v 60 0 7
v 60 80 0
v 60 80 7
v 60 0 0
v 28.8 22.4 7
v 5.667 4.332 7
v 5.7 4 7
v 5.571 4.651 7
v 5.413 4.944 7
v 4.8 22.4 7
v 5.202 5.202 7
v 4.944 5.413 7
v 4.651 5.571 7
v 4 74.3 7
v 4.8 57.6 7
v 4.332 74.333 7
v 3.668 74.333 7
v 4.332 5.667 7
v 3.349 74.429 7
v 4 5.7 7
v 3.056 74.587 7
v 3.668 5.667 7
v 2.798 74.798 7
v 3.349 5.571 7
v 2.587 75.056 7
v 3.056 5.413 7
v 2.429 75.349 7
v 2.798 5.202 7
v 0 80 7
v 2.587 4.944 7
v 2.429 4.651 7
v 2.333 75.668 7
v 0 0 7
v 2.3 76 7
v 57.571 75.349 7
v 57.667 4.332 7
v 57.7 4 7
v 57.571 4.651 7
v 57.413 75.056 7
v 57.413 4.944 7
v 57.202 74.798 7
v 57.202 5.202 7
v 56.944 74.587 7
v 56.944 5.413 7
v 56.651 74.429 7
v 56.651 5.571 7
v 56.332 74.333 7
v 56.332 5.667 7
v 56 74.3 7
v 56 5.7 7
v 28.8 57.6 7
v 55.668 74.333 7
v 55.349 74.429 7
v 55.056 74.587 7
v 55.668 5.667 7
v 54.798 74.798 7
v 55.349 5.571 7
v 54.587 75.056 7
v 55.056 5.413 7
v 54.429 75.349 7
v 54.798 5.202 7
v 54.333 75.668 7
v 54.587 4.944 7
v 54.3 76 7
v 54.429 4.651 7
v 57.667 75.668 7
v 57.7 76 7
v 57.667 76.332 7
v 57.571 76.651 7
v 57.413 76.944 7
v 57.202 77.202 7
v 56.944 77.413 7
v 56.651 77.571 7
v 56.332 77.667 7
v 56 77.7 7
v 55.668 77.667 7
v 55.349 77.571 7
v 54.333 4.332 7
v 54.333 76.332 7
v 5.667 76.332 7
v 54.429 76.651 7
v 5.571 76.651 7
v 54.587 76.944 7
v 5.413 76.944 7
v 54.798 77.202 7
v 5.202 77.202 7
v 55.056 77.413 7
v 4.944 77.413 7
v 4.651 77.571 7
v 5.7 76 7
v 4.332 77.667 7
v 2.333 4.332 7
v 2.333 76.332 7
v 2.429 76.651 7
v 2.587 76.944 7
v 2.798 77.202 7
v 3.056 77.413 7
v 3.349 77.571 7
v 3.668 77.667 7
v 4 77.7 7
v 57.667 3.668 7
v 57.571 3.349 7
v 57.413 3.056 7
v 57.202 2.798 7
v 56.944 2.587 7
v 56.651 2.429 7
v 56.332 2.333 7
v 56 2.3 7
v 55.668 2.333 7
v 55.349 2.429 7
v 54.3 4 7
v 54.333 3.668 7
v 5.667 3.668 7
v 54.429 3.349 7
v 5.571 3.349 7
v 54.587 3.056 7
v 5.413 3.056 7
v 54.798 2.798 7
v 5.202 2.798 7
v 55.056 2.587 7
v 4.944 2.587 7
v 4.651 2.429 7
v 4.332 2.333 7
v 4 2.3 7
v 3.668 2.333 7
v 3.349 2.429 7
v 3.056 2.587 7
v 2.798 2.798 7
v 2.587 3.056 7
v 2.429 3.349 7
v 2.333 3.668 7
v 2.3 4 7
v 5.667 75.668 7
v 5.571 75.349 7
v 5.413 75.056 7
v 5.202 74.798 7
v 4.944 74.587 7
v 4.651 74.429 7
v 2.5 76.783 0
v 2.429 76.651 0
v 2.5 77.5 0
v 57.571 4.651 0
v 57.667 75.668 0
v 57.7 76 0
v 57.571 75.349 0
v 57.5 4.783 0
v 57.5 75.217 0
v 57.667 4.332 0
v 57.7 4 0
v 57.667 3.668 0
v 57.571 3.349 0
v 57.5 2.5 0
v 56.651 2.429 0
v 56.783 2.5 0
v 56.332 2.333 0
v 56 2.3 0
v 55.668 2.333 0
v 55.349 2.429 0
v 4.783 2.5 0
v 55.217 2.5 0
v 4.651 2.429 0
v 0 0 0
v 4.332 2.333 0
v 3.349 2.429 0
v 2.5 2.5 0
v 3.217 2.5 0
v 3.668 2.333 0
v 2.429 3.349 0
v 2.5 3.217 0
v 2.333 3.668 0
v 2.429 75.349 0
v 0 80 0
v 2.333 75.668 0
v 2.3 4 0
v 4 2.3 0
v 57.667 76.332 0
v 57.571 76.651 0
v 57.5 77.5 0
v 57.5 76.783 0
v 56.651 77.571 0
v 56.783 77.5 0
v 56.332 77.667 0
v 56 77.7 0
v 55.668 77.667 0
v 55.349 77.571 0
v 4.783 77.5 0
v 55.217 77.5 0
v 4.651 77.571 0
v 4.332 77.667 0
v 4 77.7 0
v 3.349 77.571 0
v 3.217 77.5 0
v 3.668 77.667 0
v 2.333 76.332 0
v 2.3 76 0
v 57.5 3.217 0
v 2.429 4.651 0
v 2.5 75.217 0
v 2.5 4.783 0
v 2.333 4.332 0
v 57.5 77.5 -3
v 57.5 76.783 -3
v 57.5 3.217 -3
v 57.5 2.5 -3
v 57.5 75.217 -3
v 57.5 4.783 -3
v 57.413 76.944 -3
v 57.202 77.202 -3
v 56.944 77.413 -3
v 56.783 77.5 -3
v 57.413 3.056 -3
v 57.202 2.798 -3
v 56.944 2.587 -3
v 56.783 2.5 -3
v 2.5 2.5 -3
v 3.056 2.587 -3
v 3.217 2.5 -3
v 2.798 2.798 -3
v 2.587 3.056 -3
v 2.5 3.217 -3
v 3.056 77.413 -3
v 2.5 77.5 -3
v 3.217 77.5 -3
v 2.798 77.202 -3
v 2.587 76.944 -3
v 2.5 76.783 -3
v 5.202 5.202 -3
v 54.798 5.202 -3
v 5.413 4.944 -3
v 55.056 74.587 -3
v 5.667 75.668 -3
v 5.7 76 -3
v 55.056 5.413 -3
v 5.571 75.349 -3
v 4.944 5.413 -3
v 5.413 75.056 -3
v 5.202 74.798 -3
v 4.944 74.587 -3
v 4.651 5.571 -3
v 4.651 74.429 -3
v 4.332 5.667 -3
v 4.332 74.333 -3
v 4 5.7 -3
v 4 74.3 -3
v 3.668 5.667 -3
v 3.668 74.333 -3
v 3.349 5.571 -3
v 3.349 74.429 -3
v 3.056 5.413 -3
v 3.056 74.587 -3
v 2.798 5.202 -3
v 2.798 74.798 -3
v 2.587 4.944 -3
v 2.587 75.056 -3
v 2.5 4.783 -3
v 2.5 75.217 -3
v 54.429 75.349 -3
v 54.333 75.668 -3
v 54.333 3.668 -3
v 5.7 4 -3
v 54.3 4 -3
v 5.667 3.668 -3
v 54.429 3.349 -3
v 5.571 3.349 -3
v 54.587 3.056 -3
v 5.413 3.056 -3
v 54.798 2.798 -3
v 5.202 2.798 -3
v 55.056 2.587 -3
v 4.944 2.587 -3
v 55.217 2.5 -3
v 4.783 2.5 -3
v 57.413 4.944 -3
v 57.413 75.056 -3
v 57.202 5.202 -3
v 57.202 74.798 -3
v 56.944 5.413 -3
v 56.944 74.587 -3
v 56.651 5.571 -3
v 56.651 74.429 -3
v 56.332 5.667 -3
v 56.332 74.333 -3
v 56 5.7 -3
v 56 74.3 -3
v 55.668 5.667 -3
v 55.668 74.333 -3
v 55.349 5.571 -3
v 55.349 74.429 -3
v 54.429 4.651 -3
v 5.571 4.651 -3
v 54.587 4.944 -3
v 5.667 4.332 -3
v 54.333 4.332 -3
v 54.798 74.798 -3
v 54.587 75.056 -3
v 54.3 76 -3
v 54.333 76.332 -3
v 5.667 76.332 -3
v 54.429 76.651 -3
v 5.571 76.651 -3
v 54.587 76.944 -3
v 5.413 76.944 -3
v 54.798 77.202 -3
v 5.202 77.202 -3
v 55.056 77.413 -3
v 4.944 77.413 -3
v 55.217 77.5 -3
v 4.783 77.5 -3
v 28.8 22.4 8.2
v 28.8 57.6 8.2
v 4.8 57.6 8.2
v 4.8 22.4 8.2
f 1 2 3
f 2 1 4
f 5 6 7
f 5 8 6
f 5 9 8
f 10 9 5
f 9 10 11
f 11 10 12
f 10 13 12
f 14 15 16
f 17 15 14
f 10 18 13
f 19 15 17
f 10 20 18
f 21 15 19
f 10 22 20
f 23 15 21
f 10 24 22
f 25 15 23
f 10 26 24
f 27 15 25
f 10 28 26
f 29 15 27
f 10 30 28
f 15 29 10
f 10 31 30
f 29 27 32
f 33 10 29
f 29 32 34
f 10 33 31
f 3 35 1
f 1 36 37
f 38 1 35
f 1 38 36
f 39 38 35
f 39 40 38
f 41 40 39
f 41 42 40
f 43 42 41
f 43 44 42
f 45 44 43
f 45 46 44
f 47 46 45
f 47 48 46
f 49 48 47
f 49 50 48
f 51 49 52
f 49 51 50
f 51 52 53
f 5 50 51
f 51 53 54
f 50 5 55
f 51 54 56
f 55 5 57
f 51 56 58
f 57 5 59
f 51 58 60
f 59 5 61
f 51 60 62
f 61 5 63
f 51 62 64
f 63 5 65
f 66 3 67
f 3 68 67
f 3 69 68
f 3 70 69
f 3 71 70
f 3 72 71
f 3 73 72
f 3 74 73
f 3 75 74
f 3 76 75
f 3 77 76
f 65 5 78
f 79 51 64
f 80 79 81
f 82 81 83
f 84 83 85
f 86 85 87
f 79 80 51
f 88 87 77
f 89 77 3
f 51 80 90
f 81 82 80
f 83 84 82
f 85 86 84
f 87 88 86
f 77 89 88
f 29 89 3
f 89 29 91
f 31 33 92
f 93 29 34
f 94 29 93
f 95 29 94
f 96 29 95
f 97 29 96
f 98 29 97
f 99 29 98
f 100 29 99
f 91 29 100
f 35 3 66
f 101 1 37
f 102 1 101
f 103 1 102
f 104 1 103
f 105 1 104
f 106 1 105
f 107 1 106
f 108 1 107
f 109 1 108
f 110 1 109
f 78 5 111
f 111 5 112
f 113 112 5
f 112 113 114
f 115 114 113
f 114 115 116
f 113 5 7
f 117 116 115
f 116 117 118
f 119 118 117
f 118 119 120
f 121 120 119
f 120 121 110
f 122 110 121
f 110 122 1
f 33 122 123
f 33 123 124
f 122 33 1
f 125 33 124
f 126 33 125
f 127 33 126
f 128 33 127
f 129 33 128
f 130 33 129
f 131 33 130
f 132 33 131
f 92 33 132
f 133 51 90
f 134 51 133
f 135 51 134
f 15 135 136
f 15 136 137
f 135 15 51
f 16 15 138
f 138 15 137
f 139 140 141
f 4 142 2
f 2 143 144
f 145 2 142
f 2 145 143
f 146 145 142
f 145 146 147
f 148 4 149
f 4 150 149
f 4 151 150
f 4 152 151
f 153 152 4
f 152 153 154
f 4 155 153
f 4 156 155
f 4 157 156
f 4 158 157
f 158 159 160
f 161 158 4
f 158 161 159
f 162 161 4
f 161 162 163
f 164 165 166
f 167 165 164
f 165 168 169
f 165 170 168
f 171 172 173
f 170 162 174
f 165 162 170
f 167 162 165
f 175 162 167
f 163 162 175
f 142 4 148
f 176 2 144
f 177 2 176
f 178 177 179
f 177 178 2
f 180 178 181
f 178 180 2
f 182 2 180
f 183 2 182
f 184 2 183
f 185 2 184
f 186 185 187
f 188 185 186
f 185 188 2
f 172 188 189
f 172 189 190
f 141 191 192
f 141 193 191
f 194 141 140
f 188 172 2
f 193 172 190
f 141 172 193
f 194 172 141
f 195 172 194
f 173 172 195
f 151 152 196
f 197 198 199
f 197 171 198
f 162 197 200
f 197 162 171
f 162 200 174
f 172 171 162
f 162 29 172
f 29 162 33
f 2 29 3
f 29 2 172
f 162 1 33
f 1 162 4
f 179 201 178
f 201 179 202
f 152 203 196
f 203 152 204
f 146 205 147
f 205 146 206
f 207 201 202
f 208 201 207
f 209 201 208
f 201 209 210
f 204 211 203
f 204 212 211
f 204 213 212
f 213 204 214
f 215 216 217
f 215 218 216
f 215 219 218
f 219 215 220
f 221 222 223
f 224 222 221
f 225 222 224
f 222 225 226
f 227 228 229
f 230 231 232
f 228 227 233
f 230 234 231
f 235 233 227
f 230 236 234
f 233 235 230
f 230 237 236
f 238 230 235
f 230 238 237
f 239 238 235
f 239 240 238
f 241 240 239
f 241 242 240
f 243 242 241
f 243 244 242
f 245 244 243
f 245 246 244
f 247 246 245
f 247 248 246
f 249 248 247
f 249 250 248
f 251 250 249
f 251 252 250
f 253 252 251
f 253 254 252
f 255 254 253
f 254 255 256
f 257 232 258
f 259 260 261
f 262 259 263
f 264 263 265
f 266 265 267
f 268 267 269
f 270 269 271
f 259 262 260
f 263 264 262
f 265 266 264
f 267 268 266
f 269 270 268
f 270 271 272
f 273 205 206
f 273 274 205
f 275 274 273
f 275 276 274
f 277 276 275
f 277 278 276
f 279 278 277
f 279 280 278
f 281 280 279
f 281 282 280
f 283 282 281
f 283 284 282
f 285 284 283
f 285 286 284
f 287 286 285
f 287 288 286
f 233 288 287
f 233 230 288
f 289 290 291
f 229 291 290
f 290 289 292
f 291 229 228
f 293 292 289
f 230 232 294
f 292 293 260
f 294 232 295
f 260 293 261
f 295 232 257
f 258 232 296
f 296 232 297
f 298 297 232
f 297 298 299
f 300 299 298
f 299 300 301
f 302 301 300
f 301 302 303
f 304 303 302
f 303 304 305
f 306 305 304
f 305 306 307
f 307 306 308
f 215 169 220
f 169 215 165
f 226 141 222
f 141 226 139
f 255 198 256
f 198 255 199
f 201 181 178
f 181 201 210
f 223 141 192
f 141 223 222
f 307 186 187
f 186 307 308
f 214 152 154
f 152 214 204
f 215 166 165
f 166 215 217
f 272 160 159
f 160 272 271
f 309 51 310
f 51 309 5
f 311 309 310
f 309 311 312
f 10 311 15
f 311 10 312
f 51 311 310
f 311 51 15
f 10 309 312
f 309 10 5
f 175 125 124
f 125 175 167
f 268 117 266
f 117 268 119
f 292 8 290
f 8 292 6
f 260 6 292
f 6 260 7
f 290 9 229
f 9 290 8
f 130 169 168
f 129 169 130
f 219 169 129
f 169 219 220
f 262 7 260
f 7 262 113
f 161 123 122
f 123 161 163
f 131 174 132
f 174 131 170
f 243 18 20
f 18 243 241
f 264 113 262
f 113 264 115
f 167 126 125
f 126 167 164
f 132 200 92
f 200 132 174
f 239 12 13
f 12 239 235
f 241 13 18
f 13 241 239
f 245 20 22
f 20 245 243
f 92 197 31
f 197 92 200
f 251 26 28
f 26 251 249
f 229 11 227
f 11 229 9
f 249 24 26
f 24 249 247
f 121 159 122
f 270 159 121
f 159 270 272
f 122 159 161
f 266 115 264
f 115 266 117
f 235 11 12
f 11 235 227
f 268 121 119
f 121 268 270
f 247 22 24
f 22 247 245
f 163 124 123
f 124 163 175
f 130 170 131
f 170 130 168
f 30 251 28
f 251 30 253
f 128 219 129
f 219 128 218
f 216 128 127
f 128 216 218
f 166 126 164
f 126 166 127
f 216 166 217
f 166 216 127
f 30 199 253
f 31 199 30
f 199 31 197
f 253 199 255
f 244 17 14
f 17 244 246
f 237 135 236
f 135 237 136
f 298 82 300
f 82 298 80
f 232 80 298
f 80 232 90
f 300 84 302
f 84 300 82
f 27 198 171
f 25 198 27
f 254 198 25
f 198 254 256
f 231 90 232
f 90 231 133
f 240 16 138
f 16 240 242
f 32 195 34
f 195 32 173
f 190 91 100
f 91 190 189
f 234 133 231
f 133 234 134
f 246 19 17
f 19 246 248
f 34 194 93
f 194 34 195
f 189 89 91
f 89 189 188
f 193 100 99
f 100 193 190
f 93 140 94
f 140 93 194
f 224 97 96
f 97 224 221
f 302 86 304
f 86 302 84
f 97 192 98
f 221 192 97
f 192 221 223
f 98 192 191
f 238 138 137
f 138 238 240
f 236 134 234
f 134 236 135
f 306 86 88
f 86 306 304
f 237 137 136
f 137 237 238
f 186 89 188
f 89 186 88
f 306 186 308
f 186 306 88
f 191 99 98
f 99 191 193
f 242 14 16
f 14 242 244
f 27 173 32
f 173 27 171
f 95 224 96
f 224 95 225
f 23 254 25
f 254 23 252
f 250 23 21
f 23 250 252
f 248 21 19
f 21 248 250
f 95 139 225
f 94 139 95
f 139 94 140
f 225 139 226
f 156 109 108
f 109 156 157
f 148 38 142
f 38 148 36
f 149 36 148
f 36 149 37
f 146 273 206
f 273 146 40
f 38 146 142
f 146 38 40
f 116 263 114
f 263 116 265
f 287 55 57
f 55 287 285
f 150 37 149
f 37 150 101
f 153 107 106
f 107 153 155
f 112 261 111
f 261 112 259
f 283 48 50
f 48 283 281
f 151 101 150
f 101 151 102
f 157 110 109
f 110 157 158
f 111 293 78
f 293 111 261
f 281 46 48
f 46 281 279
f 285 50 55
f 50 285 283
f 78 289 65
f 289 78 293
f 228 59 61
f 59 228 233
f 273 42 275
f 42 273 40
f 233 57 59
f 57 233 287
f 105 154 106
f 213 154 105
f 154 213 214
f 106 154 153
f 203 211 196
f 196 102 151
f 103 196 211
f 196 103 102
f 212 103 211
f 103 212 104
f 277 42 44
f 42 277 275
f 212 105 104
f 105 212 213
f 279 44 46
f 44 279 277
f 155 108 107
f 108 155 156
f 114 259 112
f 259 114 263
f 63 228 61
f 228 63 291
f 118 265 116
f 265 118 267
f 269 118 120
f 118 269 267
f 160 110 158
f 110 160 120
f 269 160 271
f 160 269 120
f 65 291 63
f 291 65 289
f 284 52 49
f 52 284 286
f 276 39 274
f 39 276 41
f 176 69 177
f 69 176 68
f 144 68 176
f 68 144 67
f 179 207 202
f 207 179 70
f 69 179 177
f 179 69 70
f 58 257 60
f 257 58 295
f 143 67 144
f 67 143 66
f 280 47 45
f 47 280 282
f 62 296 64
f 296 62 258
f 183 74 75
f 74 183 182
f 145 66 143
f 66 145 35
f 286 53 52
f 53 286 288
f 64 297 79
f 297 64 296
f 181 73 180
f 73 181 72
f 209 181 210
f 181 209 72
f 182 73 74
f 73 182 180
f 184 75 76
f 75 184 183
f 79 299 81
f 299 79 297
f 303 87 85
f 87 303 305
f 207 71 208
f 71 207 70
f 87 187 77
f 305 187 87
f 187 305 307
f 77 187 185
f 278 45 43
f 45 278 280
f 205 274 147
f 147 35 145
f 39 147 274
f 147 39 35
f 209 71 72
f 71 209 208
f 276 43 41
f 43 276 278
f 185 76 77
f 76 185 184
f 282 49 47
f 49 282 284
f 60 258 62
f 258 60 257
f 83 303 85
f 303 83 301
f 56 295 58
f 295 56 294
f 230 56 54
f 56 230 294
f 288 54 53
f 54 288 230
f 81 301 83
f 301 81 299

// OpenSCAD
$fn = 32;

// ----------------------------------------------------------------------
// Enclosure lid: 60 x 80 x 7 mm, 4 bolt holes
// ----------------------------------------------------------------------

// --- parameters (mm) ---
length = 60;              // lid length, X
width = 80;               // lid width, Y
plate_t = 7;              // lid plate thickness
bolt_d = 3.4;             // bolt clearance
boss_lip = 4;             // bolt hole inset from the corner
sink = 1;                 // overlap of the lip and ribs into the plate
lip_h = 4;                // lip height below the plate
lip_wall = 2.5;           // lip wall thickness
label_h = 1.2;            // raised marking pad

module plate() {
  cube([length, width, plate_t]);
  /* lip that drops into the housing opening, sunk into the plate */
  translate([lip_wall, lip_wall, -lip_h + sink]) cube([length - 2 * lip_wall, width - 2 * lip_wall, lip_h]);
  /* raised marking pad on top, sunk 1 mm into the plate */
  translate([length * 0.08, width * 0.28, plate_t - 1]) cube([length * 0.4, width * 0.44, label_h + 1]);
}

difference() {
  plate();
  /* bolt pattern matching the corner bosses */
  for (sx = [0, 1]) for (sy = [0, 1])
    translate([sx * (length - 2 * boss_lip) + boss_lip, sy * (width - 2 * boss_lip) + boss_lip, -lip_h - 1])
      cylinder(h = plate_t + lip_h + 2, d = bolt_d);
}
